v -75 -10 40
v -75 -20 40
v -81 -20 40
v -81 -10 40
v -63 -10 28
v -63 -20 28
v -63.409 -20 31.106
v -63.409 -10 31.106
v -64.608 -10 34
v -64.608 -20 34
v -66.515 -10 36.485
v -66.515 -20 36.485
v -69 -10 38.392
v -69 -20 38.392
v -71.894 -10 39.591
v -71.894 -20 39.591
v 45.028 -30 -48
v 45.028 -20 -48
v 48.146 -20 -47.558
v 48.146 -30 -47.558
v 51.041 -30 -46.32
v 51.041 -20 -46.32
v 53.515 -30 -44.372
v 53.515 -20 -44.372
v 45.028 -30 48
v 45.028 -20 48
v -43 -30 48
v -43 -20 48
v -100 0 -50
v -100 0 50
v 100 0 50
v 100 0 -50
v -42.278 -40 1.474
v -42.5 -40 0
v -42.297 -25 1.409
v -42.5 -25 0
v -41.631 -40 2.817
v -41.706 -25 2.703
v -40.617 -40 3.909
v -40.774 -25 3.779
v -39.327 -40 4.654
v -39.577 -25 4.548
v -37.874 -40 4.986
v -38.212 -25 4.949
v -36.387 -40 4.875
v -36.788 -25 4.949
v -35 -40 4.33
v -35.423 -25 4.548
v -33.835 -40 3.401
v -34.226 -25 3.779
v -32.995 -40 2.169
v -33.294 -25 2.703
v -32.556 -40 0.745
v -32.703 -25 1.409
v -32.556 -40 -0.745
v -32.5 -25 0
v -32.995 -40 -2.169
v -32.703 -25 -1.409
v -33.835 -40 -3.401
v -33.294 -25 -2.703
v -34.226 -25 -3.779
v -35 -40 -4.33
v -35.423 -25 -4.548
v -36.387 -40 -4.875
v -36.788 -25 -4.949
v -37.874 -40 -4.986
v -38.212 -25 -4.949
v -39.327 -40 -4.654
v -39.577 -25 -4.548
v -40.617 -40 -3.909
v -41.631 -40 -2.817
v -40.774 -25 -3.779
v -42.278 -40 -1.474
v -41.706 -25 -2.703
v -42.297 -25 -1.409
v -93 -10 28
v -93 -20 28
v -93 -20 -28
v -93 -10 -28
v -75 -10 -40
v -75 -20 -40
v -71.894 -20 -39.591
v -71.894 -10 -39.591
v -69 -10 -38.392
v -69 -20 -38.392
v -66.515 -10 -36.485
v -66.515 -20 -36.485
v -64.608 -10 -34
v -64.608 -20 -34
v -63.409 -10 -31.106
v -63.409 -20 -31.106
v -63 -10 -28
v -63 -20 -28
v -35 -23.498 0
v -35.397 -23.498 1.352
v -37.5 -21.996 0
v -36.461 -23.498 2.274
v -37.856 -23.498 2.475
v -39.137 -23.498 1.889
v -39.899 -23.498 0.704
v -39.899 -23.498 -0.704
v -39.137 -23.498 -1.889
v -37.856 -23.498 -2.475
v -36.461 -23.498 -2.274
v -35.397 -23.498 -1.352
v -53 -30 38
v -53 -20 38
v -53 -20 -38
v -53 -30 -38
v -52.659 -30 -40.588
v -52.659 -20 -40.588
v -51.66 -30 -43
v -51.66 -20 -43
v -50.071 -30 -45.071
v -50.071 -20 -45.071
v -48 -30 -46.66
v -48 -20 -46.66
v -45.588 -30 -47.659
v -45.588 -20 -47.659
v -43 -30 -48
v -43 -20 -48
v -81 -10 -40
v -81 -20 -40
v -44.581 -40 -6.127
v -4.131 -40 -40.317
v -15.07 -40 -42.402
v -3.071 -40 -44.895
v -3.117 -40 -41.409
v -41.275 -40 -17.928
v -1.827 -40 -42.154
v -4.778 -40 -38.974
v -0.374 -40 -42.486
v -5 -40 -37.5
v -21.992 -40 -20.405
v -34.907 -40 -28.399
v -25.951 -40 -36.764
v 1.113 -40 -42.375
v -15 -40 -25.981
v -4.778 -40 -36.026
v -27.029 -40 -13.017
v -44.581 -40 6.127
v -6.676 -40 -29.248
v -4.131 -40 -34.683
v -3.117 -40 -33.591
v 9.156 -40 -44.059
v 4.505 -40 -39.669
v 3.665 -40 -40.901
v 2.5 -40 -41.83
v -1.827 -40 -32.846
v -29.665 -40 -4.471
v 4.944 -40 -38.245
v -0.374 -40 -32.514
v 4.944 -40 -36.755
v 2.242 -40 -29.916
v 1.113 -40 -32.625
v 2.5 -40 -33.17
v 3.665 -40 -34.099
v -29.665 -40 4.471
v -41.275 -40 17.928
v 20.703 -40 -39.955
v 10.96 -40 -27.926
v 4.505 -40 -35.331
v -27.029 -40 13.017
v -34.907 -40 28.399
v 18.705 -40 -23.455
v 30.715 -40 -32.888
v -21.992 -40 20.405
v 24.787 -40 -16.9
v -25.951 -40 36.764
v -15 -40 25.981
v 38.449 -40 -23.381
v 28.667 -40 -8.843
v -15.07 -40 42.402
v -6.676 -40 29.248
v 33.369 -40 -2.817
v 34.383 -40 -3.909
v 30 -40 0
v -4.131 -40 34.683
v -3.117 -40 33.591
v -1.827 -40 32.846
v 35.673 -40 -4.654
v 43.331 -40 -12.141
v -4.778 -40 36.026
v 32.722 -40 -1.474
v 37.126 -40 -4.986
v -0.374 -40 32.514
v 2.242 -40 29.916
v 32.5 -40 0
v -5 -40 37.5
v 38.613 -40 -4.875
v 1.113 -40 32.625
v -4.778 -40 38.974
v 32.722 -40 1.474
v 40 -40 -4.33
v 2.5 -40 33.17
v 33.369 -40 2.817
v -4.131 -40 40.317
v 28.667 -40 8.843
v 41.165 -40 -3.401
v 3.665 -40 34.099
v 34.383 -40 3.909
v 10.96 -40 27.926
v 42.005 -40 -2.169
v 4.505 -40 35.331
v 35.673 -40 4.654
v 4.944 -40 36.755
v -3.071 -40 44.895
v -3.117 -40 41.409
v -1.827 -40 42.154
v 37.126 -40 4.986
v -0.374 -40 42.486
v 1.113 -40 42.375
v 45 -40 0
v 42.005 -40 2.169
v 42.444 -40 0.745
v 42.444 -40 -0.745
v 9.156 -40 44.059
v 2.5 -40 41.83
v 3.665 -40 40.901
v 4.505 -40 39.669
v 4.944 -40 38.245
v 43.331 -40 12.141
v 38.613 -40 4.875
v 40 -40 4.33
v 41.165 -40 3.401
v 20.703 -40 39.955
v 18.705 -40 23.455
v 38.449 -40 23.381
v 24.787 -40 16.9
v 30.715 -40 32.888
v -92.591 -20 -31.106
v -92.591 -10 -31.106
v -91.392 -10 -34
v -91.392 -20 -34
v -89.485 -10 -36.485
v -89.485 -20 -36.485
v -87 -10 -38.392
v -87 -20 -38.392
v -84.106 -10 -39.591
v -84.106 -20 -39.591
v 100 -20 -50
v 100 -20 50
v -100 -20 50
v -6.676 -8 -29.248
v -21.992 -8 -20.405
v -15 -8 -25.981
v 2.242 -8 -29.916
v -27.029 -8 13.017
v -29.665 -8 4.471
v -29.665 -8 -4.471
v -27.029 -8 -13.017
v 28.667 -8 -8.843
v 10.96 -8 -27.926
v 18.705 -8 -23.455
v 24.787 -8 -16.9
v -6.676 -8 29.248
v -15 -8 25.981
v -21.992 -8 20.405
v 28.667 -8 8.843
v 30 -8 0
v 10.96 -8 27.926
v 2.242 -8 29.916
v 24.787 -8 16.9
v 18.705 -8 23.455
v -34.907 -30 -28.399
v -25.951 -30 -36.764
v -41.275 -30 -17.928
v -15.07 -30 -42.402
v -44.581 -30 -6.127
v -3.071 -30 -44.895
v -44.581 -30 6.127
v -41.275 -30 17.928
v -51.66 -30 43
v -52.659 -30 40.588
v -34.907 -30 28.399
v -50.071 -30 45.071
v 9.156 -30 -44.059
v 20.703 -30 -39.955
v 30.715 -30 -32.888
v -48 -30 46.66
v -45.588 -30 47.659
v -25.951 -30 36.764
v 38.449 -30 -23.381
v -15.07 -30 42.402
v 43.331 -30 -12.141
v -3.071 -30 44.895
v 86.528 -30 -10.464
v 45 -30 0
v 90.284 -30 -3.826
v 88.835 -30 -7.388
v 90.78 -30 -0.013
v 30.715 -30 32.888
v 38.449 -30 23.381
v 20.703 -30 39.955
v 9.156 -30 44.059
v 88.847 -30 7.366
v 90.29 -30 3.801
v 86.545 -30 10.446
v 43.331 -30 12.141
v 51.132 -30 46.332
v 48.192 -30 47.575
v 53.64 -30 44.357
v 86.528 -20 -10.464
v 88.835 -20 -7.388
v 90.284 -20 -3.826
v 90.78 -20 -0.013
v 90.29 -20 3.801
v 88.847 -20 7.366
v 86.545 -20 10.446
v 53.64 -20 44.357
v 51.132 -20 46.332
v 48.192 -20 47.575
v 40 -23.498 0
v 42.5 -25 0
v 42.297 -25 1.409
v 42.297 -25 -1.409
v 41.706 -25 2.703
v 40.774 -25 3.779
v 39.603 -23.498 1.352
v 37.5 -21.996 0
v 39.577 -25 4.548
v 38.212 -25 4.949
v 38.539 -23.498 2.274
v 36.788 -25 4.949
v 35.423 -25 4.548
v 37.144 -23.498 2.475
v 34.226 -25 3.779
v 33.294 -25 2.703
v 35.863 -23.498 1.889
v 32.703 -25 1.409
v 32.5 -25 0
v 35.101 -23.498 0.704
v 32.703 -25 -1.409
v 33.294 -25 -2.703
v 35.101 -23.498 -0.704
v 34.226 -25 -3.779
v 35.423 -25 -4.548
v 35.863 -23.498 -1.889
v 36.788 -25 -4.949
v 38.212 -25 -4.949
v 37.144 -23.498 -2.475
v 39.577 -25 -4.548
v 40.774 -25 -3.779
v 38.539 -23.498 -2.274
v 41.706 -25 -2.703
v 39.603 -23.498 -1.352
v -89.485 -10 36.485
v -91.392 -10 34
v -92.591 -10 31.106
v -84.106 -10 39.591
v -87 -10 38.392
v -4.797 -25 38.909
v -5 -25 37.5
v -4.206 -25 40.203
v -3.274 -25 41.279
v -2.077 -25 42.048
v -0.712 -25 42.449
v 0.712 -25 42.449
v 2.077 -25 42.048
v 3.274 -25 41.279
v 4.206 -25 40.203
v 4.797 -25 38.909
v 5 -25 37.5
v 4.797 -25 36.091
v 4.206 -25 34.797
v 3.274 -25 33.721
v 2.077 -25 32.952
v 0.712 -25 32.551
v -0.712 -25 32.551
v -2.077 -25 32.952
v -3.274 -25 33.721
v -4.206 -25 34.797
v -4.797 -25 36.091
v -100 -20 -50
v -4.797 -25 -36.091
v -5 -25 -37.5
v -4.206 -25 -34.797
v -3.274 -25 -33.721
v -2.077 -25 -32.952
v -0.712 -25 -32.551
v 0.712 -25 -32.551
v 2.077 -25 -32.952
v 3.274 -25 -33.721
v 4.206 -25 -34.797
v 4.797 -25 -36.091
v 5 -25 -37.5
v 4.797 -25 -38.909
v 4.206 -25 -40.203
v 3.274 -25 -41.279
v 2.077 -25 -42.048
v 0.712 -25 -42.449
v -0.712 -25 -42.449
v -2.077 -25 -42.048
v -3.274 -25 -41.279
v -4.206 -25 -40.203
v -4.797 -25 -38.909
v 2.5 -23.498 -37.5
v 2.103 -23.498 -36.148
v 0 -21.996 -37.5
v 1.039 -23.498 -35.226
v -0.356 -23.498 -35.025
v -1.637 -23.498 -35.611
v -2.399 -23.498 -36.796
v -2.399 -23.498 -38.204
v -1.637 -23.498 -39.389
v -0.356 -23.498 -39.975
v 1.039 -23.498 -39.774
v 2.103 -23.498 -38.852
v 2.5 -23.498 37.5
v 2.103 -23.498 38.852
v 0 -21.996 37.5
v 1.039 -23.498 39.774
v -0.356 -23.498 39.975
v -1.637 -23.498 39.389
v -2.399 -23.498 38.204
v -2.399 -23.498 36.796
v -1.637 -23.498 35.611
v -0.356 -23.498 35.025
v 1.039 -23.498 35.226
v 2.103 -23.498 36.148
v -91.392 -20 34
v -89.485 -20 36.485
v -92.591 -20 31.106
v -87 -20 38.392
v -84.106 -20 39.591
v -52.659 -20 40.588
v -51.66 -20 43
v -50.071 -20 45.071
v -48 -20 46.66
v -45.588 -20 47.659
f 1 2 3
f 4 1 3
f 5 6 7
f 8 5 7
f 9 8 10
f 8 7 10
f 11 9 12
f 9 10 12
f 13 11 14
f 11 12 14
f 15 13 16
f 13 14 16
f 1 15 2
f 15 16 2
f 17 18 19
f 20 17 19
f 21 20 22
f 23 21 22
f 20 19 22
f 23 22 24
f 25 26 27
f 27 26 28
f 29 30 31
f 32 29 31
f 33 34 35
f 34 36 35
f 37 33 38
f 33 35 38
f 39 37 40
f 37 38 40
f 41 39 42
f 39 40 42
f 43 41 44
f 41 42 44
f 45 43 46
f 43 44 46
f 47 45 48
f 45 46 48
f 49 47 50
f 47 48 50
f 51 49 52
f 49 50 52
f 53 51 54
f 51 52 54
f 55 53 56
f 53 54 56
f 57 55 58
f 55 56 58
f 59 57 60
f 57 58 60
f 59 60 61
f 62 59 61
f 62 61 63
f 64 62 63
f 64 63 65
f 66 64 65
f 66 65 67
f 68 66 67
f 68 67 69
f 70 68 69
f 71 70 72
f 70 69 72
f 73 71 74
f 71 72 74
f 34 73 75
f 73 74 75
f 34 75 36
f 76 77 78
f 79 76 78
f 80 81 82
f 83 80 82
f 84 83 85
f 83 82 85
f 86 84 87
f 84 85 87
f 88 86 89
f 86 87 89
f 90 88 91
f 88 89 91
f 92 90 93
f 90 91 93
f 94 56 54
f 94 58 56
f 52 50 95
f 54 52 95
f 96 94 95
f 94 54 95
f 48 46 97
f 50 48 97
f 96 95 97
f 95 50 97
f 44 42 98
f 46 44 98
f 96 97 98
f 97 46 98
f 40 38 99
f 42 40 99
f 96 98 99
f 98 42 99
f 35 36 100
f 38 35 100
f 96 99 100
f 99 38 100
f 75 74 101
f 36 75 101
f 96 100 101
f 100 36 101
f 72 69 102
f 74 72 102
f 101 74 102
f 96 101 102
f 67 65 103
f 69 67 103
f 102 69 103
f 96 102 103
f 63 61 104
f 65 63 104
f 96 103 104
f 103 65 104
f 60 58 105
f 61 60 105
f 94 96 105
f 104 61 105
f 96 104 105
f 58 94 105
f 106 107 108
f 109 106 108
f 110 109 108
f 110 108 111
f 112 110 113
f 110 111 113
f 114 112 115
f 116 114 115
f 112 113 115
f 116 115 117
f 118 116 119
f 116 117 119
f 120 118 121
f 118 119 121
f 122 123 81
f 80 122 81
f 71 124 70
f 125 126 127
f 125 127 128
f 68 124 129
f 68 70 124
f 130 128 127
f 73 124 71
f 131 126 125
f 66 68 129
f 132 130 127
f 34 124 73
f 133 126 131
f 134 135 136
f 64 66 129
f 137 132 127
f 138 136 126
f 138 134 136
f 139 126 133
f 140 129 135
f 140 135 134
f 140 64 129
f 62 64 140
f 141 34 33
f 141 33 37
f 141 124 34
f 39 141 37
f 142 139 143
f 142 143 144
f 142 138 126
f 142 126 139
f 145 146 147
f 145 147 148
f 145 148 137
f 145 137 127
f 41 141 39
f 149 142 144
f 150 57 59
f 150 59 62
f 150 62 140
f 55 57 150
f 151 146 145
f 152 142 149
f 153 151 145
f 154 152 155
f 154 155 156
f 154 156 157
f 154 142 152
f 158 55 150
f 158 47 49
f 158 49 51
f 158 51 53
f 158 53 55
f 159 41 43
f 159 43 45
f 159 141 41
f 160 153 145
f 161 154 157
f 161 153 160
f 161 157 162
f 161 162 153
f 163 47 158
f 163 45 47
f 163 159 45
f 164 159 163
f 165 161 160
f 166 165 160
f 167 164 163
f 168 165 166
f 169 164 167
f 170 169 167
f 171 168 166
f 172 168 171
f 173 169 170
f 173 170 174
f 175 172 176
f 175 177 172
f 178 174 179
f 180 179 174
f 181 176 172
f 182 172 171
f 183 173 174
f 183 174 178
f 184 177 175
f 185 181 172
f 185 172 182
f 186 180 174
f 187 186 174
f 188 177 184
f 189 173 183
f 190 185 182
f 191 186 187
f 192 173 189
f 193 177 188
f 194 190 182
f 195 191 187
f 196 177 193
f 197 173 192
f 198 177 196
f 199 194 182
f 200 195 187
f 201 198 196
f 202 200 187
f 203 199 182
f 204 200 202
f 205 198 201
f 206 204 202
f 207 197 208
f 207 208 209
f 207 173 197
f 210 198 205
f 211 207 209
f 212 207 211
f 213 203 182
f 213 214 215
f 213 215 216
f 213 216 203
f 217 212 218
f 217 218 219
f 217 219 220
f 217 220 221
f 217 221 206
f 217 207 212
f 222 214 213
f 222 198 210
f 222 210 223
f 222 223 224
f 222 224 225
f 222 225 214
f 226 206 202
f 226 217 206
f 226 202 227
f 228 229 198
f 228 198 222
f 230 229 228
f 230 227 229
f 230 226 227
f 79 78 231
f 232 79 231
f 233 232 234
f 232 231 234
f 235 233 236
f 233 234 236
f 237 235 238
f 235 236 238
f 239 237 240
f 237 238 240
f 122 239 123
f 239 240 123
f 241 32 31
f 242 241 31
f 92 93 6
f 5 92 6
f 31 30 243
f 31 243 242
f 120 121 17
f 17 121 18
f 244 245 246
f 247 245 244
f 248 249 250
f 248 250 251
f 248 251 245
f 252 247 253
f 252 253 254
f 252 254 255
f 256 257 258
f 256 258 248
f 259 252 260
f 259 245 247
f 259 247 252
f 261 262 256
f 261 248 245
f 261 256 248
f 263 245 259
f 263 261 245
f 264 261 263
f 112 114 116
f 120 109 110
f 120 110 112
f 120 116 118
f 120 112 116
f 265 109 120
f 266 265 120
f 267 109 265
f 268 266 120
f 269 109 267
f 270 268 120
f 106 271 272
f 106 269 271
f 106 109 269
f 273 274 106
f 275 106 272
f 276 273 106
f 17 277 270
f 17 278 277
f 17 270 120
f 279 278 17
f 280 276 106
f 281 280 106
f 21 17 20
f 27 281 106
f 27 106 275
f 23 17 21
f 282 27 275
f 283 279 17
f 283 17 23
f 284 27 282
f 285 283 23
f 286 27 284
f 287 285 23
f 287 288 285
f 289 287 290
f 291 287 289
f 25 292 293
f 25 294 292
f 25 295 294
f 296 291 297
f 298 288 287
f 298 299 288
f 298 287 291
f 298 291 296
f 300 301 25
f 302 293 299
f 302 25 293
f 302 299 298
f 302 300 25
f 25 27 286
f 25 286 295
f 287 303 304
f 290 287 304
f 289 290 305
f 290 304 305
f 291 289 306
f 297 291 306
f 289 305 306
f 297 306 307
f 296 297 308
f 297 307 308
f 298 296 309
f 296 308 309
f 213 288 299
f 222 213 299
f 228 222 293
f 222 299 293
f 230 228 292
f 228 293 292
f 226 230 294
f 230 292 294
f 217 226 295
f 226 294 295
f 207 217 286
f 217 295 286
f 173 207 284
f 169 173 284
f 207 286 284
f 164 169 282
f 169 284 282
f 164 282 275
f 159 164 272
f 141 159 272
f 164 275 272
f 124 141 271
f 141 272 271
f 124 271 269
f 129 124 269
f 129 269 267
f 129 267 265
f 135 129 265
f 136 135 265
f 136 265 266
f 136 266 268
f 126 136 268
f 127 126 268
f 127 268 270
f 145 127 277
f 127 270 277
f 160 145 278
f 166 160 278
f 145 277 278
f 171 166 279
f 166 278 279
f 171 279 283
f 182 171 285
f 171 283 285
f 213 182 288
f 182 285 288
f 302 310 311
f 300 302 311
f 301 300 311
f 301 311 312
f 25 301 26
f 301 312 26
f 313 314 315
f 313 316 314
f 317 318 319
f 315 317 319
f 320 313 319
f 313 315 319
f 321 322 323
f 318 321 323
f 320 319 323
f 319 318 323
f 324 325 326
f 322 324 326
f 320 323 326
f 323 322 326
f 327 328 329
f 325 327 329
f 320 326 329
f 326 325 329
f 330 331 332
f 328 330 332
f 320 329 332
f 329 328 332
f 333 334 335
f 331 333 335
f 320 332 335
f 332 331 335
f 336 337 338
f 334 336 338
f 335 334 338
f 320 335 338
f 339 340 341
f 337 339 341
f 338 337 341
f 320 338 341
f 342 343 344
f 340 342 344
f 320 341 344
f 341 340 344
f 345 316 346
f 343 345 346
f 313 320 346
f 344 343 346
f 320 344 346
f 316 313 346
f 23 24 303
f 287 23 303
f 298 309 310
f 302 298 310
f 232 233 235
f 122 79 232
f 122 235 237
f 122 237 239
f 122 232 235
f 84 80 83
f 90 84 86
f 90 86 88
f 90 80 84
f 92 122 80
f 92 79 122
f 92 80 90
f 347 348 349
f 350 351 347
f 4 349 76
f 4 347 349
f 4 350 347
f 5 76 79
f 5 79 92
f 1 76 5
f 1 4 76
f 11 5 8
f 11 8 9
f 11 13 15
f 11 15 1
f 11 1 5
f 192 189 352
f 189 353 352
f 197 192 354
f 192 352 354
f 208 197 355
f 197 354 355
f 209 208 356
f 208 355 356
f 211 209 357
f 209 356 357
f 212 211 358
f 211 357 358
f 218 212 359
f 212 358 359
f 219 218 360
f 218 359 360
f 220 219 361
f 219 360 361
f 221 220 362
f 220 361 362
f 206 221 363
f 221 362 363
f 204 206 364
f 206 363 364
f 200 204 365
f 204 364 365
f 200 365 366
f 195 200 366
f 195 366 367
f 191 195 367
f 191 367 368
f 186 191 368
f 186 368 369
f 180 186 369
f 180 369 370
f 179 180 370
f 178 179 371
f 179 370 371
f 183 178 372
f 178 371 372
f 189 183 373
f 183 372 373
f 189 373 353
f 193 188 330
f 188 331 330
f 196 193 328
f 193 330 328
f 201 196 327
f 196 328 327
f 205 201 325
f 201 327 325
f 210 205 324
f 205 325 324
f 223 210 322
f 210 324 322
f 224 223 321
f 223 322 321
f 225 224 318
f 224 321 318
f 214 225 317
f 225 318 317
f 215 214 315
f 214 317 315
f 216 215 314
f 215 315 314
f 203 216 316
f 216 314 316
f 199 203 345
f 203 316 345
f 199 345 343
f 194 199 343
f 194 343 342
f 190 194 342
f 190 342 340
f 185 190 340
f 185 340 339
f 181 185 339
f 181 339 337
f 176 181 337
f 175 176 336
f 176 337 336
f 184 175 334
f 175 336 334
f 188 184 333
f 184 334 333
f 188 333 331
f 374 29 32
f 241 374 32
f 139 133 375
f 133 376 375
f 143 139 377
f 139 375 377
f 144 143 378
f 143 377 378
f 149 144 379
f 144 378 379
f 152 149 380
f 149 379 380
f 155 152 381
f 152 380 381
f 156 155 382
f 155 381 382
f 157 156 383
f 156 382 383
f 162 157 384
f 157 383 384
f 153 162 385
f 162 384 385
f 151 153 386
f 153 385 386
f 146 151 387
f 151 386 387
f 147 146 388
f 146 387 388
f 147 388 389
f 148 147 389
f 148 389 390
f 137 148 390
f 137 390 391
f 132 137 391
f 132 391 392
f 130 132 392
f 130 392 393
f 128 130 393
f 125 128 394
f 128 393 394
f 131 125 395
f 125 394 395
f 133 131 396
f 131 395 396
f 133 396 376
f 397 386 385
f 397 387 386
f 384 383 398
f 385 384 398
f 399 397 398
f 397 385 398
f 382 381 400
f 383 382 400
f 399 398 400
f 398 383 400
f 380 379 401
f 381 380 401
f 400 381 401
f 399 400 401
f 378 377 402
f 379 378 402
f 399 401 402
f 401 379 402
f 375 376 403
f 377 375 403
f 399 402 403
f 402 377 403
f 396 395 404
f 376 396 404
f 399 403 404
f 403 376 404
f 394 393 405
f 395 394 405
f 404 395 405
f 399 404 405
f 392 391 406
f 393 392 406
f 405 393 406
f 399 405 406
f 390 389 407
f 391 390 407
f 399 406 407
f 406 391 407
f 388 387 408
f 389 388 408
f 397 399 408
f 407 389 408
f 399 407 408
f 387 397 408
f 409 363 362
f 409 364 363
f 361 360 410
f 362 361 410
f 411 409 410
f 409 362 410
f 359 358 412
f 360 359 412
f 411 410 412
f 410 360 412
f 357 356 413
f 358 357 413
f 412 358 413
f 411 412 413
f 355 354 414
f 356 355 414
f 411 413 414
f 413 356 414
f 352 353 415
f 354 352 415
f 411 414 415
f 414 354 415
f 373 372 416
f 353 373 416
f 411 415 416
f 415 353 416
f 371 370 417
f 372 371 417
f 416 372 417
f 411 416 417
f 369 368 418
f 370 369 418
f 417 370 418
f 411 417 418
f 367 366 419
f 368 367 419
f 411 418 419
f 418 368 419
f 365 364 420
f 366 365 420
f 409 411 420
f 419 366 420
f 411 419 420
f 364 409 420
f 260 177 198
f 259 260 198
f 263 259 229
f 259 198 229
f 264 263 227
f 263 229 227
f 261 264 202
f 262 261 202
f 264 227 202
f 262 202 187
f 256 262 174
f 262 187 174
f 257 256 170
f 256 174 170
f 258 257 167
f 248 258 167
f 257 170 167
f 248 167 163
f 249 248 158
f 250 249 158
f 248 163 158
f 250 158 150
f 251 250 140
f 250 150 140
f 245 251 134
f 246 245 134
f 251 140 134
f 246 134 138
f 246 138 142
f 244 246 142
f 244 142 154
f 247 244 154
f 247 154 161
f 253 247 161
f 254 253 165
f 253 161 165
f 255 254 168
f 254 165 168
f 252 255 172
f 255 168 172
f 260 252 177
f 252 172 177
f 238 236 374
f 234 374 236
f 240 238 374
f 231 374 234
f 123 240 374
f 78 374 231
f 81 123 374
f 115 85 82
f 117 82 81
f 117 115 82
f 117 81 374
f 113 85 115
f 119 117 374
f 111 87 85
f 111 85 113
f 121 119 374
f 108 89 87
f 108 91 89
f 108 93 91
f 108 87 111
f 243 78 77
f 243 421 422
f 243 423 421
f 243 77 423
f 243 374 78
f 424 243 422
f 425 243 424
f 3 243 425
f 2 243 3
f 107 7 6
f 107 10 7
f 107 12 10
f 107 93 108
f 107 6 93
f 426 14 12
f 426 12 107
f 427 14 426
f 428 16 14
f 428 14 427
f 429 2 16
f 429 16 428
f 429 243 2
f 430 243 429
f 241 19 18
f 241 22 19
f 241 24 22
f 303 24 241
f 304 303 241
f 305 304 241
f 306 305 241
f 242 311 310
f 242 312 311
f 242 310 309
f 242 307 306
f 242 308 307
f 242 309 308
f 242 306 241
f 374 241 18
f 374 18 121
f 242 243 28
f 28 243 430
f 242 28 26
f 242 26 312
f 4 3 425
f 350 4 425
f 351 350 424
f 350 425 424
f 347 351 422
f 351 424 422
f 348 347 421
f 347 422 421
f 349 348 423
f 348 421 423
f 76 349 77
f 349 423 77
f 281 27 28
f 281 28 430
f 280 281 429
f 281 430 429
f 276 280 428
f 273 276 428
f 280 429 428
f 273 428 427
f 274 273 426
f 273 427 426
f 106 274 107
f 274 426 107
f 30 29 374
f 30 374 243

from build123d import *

# Parameters (mm, degrees)
F0_W      = 200
F0_H      = 100
F1_DEPTH  = 20
F3_DEPTH  = 10
F5_DEPTH  = 10
F6_R      = 45
F7_DEPTH  = 10
F8_R      = 30
F9_DEPTH  = 32
F11_D     = 10
F11_DEPTH = 15
F11_TIP   = 3.0043030951


# Not quite as in the source:
# - a feature names something its author has since deleted; it is built from what else it names


with BuildPart() as f1:
    # F0 (on Front) → F1 (new body)
    with BuildSketch(Plane.XZ):
        Rectangle(F0_W, F0_H)
    extrude(amount=F1_DEPTH)

    # F2 (on face) → F3 (cut)
    with BuildSketch(Plane.XZ.offset(20)):
        with BuildLine():
            Line((-75, 40), (-81, 40))
            ThreePointArc((-81, 40), (-89.4852813742, 36.4852813742), (-93, 28))
            Line((-93, 28), (-93, -28))
            ThreePointArc((-93, -28), (-89.4852813742, -36.4852813742), (-81, -40))
            Line((-81, -40), (-75, -40))
            ThreePointArc((-75, -40), (-66.5147186258, -36.4852813742), (-63, -28))
            Line((-63, -28), (-63, 28))
            ThreePointArc((-63, 28), (-66.5147186258, 36.4852813742), (-75, 40))
        make_face()
    extrude(amount=-F3_DEPTH, mode=Mode.SUBTRACT)

    # F4 (on face) → F5 (join)
    with BuildSketch(Plane.XZ.offset(20)):
        with BuildLine():
            Line((45.028, 48), (-43, 48))
            ThreePointArc((-43, 48), (-50.0710678119, 45.0710678119), (-53, 38))
            Line((-53, 38), (-53, -38))
            ThreePointArc((-53, -38), (-50.0710678119, -45.0710678119), (-43, -48))
            Line((-43, -48), (45.028, -48))
            ThreePointArc((45.028, -48), (49.6343185527, -47.0344012956), (53.515, -44.3715338615))
            Line((53.515, -44.3715338615), (86.5275302355, -10.4637753147))
            ThreePointArc((86.5275302355, -10.4637753147), (90.7799947329, -0.0125702902), (86.5450528262, 10.4457473475))
            Line((86.5450528262, 10.4457473475), (53.640042261, 44.356597878))
            ThreePointArc((53.640042261, 44.356597878), (49.7035120288, 47.0516780295), (45.028, 48))
        make_face()
    extrude(amount=F5_DEPTH)

    # F6 (on face) → F7 (join)
    with BuildSketch(Plane.XZ.offset(30)):
        Circle(F6_R)
    extrude(amount=F7_DEPTH)

    # F8 (on face) → F9 (cut)
    with BuildSketch(Plane.XZ.offset(40)):
        Circle(F8_R)
    extrude(amount=-F9_DEPTH, mode=Mode.SUBTRACT)

    # F11
    with Locations(Plane.XZ.offset(40)):
        with Locations((-37.5, 0), (0, 37.5), (37.5, 0), (0, -37.5)):
            Hole(F11_D / 2, depth=F11_DEPTH)
            with Locations((0, 0, -(F11_DEPTH + F11_TIP / 2))):  # 118° drill point
                Cone(0, F11_D / 2, F11_TIP, mode=Mode.SUBTRACT)


solid = f1.part
